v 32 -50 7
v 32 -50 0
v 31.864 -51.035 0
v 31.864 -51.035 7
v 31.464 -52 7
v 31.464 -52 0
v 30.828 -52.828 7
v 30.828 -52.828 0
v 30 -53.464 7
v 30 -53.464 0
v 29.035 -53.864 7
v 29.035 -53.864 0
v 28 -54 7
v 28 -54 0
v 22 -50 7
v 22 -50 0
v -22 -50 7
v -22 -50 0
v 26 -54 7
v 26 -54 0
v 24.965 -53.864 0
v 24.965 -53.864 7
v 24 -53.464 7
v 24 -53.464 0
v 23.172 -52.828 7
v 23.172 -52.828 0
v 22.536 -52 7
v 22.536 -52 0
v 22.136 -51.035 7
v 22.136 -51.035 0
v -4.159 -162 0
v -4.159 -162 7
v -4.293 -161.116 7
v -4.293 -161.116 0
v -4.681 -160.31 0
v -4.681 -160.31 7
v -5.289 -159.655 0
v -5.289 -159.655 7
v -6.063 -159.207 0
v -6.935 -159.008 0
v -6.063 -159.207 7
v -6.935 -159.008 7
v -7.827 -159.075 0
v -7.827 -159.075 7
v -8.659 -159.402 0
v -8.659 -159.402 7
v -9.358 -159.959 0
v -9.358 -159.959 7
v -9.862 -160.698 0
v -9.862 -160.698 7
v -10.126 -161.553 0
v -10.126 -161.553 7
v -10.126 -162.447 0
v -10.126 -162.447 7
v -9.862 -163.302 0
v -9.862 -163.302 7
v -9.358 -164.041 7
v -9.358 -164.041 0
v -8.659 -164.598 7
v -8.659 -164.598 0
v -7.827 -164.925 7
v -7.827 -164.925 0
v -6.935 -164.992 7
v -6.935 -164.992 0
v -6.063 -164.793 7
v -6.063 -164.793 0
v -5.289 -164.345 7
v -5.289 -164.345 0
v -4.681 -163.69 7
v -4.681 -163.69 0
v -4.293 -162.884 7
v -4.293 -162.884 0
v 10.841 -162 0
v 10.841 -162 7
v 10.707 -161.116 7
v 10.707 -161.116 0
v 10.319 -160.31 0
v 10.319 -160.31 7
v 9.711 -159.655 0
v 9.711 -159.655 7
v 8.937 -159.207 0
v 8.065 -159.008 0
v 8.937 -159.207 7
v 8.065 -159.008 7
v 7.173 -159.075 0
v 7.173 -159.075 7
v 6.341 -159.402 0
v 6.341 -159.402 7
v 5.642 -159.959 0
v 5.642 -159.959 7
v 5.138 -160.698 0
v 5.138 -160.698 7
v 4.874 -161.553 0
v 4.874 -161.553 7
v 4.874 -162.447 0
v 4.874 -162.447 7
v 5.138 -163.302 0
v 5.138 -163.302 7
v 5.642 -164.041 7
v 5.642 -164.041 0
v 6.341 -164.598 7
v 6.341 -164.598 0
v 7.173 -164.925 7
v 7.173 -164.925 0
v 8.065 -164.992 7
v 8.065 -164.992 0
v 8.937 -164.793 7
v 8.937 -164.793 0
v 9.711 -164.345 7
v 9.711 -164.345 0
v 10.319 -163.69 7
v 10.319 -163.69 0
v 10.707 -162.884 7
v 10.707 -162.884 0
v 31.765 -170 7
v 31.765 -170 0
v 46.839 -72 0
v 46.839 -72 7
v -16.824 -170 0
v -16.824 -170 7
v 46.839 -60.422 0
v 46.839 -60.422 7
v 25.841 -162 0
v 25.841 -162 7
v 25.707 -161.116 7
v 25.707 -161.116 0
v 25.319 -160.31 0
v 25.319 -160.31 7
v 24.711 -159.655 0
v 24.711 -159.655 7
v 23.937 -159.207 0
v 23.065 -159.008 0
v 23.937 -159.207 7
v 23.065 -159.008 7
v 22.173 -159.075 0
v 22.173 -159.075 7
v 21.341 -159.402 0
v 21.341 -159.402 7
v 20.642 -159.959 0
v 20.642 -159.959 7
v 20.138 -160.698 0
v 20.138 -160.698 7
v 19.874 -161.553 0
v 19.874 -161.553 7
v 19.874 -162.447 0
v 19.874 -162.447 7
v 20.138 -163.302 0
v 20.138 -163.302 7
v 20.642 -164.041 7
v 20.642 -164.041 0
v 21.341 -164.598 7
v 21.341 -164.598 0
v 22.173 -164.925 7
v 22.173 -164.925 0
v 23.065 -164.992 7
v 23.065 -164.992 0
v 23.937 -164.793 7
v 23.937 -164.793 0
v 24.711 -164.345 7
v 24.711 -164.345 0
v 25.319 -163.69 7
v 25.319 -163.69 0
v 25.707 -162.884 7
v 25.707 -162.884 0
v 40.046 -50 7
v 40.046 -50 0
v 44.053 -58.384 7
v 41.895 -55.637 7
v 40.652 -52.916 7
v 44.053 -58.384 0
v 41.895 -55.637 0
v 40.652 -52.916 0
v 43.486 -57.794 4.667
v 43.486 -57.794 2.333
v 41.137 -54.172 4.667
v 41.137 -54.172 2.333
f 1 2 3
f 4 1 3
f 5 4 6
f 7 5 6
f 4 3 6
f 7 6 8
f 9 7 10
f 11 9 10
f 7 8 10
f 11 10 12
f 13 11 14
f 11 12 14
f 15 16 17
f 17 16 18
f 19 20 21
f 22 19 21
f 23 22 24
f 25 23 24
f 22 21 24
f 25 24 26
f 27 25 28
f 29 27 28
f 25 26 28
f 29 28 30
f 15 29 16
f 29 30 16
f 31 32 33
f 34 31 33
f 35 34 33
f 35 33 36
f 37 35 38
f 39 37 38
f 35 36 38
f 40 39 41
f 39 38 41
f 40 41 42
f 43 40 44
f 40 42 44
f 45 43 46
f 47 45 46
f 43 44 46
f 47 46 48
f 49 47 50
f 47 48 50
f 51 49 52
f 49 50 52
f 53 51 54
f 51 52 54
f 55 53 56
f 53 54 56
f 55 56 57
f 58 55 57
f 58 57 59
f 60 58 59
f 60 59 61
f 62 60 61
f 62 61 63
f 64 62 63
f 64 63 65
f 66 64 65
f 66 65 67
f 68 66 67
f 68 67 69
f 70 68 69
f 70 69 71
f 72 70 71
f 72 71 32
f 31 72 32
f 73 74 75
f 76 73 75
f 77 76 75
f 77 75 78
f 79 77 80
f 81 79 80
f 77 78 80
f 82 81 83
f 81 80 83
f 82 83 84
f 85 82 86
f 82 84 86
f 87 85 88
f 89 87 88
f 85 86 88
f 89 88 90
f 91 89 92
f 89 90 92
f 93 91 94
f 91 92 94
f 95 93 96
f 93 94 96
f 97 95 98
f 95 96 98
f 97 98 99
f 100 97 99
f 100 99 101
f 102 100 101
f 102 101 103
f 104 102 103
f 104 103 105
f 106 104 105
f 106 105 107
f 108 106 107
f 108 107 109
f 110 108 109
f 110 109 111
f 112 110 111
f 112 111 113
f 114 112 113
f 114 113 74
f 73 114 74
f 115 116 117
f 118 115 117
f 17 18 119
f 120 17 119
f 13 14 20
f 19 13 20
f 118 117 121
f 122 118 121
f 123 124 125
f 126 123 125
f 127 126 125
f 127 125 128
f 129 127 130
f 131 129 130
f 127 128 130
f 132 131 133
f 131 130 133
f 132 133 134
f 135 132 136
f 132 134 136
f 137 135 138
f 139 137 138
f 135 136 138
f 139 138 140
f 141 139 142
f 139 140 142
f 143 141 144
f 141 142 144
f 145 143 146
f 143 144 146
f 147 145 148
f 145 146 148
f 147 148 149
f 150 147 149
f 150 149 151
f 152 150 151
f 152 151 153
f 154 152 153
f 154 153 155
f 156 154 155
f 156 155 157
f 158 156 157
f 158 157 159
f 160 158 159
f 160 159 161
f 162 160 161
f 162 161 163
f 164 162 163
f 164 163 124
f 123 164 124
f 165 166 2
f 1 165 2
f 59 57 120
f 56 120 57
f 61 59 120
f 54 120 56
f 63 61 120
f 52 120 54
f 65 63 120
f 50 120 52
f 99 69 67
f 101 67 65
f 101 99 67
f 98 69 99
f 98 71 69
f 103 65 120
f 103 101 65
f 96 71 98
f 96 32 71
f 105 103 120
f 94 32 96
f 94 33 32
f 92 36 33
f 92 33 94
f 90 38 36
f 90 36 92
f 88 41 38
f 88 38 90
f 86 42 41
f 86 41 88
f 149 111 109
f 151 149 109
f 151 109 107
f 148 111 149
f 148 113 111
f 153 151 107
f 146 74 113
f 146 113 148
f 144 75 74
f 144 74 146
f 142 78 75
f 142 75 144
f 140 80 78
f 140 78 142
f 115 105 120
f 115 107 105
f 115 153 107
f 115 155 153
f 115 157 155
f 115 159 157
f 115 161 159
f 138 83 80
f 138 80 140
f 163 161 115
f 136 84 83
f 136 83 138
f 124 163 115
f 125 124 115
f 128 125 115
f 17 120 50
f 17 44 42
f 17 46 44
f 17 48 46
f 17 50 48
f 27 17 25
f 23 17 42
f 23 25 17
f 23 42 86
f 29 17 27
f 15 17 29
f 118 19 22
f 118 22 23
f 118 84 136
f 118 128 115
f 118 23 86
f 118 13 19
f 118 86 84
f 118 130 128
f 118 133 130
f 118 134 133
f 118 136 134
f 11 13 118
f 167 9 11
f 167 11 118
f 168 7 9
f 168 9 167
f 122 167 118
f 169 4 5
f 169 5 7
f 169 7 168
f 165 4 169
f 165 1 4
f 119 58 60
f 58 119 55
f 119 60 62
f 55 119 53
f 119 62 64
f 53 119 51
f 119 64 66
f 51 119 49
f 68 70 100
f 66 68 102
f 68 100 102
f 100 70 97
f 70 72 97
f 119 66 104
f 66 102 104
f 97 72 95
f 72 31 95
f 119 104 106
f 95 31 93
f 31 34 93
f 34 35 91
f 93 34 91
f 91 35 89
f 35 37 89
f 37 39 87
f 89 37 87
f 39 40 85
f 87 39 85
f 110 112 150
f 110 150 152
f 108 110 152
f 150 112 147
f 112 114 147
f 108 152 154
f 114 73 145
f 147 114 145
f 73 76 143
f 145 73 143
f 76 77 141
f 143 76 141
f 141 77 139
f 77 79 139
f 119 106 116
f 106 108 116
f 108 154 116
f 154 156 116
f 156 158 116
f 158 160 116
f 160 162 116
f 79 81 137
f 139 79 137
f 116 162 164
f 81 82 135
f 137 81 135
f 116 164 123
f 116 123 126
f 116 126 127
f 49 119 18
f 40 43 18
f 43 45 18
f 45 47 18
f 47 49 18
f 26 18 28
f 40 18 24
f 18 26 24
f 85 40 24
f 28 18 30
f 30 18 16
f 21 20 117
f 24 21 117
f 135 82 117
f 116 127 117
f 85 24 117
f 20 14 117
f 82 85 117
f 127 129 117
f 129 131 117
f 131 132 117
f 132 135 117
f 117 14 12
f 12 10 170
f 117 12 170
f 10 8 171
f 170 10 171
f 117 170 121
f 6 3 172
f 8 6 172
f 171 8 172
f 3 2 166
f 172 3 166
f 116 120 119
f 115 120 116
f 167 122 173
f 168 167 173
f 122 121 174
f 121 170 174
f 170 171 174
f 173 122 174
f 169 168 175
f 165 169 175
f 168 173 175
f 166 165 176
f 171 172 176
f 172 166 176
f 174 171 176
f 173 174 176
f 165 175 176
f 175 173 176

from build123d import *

# Parameters (mm, degrees)
SKETCH1_R           = 4.5
BOSS_EXTRUDE1_DEPTH = 7
SKETCH2_W           = 402.918493315
SKETCH2_H           = 212.645905023
CUT_EXTRUDE1_DEPTH  = 30
SKETCH3_R           = 3
CUT_EXTRUDE2_DEPTH  = 8.0000001


with BuildPart() as part:
    # Sketch1 → Boss-Extrude1 (new body)
    with BuildSketch(Plane.XY):
        with BuildLine():
            Line((22, -50), (-22, -50))
            Line((-22, -50), (-11, -305))
            ThreePointArc((-11, -305), (0, -315.535719965), (11, -305))
            Line((11, -305), (46.838884711, -72))
            Line((46.838884711, -72), (46.838884711, -60.421650598))
            add(Edge.make_bspline(
                [(46.838884711, -60.421650596), (43.068657692, -58.44092391), (40.423050609, -54.296947681), (40.046232129, -50)],
                knots=[0, 0, 0, 0, 0.425250978, 0.425250978, 0.425250978, 0.425250978], degree=3))
            Line((40.046232129, -50), (32, -50))
            ThreePointArc((32, -50), (30.828427125, -52.828427125), (28, -54))
            Line((28, -54), (26, -54))
            ThreePointArc((26, -54), (23.171572875, -52.828427125), (22, -50))
        make_face()
        with Locations((0, -305)):
            Circle(SKETCH1_R, mode=Mode.SUBTRACT)
    extrude(amount=BOSS_EXTRUDE1_DEPTH)

    # Sketch2 → Cut-Extrude1 (cut)
    with BuildSketch(Plane.XY.offset(7)):
        with Locations((44.983042226, -276.322952512)):
            Rectangle(SKETCH2_W, SKETCH2_H)
    extrude(amount=-CUT_EXTRUDE1_DEPTH, mode=Mode.SUBTRACT)

    # Sketch3 → Cut-Extrude2 (cut, through all)
    with BuildSketch(Plane.XY.offset(7)):
        with Locations((-7.159327661, -162)):
            Circle(SKETCH3_R)
        with Locations((7.840672339, -162)):
            Circle(SKETCH3_R)
        with Locations((22.840672339, -162)):
            Circle(SKETCH3_R)
    extrude(amount=-CUT_EXTRUDE2_DEPTH, mode=Mode.SUBTRACT)


solid = part.part
